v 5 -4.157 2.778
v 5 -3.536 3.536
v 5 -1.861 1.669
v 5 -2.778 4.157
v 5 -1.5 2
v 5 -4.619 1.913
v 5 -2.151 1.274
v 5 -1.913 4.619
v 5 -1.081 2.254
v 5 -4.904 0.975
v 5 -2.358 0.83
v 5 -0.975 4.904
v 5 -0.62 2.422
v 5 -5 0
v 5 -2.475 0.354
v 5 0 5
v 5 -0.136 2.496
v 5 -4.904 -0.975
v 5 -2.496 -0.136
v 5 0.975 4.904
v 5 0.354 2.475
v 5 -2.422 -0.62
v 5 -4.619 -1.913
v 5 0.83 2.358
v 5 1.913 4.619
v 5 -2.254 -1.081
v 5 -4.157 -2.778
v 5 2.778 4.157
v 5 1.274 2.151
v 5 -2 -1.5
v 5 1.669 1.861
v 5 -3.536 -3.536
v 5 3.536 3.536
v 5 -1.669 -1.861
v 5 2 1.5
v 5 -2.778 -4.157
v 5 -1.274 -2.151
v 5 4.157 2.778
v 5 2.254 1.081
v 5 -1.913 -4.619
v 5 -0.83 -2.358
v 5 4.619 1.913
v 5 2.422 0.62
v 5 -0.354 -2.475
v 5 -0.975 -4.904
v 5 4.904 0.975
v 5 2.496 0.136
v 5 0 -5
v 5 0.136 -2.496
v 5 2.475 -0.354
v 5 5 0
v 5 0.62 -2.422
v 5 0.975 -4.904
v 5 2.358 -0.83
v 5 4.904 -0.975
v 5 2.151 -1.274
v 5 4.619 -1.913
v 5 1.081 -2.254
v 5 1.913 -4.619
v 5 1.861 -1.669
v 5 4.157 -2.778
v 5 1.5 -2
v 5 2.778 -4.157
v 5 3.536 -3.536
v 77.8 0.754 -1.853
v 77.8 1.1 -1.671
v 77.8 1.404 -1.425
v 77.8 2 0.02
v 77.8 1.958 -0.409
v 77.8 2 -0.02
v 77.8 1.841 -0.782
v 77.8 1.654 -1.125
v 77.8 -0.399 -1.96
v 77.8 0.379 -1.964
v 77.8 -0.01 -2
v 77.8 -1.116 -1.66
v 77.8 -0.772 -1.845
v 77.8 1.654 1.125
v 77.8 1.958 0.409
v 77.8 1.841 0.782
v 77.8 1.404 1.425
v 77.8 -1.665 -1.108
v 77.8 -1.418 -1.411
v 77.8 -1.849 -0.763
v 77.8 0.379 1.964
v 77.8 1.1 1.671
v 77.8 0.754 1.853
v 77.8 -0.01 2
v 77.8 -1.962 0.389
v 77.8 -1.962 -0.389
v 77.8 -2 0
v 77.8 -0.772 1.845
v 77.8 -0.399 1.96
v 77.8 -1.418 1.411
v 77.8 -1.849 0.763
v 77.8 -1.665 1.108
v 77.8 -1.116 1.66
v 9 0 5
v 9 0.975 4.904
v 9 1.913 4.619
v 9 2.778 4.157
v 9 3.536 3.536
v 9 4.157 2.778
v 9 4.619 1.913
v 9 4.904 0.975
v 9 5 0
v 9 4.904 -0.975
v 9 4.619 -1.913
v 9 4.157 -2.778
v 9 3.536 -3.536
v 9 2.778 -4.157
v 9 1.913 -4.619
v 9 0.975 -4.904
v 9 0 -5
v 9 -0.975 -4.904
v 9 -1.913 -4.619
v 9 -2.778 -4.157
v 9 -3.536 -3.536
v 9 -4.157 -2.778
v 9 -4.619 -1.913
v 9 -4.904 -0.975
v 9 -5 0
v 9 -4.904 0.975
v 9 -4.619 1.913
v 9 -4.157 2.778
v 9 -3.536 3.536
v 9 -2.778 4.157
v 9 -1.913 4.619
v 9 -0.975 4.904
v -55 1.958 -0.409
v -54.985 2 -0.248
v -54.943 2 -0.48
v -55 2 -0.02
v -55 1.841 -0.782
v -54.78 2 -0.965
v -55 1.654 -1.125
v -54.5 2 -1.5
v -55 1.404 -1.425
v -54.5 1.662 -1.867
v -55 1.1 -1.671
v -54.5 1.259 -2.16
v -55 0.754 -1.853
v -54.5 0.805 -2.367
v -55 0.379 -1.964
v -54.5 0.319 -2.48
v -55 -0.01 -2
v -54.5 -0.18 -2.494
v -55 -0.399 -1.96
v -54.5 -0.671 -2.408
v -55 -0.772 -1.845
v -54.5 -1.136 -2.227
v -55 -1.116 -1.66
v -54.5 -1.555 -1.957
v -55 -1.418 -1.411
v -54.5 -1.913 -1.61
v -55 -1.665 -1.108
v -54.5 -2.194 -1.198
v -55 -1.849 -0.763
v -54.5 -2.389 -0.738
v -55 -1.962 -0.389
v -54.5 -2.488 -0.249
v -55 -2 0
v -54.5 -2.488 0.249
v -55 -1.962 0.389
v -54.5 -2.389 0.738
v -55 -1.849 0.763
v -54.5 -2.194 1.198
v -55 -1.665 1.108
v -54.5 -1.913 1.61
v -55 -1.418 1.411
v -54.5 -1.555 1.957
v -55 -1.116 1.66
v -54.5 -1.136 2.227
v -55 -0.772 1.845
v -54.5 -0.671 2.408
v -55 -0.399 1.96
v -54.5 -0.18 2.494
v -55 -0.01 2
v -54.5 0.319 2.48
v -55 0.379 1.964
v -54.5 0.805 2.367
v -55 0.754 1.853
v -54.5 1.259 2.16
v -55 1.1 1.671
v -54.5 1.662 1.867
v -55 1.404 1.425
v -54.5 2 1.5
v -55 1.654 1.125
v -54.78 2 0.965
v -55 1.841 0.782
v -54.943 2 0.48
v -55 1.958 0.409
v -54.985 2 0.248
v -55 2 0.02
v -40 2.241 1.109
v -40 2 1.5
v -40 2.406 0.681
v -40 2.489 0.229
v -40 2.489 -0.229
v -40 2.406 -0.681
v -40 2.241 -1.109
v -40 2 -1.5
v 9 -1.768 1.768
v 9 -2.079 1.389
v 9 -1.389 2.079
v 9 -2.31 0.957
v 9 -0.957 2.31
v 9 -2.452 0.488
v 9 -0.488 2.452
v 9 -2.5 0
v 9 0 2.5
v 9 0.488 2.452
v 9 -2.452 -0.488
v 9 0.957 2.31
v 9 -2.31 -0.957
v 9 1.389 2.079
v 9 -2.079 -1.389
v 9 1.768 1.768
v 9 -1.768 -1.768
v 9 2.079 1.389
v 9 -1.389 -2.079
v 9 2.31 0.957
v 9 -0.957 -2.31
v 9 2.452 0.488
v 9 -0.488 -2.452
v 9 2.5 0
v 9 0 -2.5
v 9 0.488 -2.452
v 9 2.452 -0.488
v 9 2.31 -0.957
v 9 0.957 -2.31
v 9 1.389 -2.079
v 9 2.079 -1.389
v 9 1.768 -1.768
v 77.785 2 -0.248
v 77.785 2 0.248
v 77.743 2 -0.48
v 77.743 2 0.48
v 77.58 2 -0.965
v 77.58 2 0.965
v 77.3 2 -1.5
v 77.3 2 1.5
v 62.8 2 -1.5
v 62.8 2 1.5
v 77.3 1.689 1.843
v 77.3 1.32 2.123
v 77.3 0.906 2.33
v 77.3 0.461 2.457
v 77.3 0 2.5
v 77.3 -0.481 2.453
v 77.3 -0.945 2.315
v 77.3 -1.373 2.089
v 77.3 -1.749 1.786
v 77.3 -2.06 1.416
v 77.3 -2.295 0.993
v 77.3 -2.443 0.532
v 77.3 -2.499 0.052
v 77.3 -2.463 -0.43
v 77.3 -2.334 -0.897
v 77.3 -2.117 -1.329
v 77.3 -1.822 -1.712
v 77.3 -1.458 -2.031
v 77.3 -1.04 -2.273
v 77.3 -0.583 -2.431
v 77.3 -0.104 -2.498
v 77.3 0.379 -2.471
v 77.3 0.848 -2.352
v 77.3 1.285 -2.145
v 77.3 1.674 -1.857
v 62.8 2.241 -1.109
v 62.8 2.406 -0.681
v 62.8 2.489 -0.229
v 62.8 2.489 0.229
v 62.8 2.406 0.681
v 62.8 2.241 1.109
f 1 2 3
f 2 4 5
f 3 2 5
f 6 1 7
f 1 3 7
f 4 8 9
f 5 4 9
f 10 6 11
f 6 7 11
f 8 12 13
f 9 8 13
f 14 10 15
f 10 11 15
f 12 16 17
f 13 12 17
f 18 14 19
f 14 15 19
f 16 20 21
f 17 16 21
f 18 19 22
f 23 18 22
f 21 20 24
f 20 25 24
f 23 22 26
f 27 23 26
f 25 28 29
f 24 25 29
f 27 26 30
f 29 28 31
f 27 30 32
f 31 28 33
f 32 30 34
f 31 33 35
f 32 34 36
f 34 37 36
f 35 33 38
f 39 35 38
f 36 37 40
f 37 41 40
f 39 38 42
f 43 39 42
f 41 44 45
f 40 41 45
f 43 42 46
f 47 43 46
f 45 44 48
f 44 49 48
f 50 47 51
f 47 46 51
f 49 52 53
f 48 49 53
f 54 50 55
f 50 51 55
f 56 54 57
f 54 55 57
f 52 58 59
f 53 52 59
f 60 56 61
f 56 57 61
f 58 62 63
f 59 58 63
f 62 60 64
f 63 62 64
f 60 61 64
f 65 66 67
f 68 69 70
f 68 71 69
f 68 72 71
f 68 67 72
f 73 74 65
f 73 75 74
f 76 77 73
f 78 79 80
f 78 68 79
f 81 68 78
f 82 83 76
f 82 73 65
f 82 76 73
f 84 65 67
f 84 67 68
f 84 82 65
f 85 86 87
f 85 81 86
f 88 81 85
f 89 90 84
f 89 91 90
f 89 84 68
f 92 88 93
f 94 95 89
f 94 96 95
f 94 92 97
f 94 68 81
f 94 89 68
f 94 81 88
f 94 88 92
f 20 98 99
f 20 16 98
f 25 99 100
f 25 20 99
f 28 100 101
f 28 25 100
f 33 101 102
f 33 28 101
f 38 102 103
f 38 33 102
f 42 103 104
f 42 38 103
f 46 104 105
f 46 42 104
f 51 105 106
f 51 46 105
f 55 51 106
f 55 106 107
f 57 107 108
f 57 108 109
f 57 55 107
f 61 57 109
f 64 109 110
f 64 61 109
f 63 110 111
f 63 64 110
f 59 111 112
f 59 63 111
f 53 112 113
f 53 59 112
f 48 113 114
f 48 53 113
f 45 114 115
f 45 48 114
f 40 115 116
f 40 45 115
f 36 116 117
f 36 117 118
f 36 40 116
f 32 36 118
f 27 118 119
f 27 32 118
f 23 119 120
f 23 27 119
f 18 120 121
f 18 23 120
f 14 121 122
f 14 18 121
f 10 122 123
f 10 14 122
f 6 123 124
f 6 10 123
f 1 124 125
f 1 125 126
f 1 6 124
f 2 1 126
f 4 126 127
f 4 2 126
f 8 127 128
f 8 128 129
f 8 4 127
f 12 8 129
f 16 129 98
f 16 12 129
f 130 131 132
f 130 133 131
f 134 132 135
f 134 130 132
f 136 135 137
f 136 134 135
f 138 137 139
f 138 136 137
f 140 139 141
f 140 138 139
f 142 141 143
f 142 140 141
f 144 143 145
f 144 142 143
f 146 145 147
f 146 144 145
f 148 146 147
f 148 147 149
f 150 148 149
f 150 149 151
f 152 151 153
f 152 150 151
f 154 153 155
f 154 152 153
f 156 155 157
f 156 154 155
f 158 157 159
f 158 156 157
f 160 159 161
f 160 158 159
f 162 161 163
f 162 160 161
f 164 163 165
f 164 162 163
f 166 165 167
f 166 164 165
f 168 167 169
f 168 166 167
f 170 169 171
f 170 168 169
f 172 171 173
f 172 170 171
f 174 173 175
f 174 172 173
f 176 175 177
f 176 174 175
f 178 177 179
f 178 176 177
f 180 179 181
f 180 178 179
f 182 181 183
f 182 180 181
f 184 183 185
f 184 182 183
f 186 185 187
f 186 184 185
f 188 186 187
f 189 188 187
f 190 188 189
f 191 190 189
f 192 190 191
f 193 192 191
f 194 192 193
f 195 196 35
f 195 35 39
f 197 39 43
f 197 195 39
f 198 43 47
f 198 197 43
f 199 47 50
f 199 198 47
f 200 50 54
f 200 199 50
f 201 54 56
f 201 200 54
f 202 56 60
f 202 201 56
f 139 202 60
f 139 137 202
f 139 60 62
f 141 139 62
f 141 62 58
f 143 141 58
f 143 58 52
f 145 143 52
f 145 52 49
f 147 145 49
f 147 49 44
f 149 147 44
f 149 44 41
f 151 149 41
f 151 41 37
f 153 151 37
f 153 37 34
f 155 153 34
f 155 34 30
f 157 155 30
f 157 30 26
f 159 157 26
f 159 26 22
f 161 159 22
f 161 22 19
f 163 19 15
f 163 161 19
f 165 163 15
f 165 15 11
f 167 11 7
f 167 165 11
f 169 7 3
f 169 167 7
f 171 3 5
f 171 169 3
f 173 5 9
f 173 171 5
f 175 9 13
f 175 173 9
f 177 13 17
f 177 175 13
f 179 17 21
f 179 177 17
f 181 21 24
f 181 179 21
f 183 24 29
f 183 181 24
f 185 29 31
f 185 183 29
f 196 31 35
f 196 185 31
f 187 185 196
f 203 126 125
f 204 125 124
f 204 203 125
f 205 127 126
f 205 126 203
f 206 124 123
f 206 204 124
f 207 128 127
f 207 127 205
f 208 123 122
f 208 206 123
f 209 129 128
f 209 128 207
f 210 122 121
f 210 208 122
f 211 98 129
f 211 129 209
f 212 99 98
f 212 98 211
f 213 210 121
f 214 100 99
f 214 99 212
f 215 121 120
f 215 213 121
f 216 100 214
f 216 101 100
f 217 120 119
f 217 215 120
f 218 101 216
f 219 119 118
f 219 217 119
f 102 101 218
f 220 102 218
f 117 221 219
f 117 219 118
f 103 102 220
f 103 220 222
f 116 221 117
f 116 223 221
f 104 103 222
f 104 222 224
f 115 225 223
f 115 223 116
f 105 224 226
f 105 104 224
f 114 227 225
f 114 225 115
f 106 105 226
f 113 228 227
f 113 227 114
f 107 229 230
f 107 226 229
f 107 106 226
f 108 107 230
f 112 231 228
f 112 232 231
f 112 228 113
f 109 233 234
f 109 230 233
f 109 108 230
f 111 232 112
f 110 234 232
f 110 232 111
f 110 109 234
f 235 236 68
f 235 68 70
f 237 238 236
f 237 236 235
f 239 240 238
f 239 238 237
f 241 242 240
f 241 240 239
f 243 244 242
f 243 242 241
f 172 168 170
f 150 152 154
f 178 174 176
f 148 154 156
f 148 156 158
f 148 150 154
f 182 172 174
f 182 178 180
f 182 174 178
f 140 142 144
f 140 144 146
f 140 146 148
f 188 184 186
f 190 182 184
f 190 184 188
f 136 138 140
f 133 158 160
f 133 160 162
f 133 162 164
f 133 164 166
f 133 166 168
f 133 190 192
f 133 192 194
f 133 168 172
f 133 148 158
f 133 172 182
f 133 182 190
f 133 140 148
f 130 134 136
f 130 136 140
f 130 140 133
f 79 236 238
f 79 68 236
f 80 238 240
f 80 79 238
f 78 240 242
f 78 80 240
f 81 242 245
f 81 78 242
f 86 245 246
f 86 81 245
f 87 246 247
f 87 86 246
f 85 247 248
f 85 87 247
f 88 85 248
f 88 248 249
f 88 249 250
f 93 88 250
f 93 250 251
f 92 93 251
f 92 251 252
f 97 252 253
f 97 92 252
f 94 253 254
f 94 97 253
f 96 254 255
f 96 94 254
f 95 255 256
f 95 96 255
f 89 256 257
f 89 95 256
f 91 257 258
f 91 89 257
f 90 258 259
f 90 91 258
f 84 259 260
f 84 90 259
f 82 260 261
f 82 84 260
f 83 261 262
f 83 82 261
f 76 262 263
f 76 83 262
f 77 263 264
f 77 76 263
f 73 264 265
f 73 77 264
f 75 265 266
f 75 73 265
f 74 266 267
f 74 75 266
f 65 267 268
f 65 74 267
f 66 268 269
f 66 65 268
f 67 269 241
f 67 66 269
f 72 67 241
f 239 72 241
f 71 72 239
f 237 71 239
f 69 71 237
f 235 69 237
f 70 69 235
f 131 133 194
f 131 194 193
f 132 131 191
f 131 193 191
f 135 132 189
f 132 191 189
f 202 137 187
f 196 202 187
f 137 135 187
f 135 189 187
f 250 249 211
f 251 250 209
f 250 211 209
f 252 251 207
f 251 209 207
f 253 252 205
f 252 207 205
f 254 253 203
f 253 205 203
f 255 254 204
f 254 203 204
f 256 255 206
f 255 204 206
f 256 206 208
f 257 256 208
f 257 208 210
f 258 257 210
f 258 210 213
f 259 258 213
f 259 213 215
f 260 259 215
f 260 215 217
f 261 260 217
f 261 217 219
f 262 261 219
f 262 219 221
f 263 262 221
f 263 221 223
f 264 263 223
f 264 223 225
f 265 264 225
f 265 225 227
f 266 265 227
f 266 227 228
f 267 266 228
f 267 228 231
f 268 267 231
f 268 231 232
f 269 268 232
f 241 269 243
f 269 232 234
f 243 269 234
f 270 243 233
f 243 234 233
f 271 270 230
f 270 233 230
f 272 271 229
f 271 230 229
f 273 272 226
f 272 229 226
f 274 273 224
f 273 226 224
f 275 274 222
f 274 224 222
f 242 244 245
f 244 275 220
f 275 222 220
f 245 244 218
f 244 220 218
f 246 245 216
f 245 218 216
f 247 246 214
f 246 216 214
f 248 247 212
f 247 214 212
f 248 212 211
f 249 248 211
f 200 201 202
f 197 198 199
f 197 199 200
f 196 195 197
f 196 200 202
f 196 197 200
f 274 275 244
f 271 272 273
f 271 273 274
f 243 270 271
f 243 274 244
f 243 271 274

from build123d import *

# Parameters (mm, degrees)
SKETCH1_W           = 4
SKETCH1_H           = 5
SKETCH2_R           = 2.5
BOSS_EXTRUDE1_DEPTH = 68.8
CUT_EXTRUDE1_START  = -15
CUT_EXTRUDE1_DEPTH  = 15
BOSS_EXTRUDE2_START = 60
SKETCH4_R           = 2.5
BOSS_EXTRUDE2_DEPTH = 60
CUT_EXTRUDE2_DEPTH  = 15
CHAMFER1_SIZE       = 0.5


with BuildPart() as part:
    # Sketch1 → Revolve1 (revolve)
    with BuildSketch(Plane(origin=(0, 0, 0), x_dir=(-1, 0, 0), z_dir=(0, 0, -1)), mode=Mode.PRIVATE) as revolve1_sk:
        with Locations((-7, 2.5)):
            Rectangle(SKETCH1_W, SKETCH1_H)
    revolve(revolve1_sk.sketch.rotate(Axis((9, 0, 0), (-1, 0, 0)), 270), axis=Axis((9, 0, 0), (-1, 0, 0)))

    # Sketch2 → Boss-Extrude1 (add)
    with BuildSketch(Plane(origin=(9, 0, 0), x_dir=(0, 0, -1), z_dir=(1, 0, 0))):
        with Locations(Location((0, 0, 0), (0, 0, 180))):
            Circle(SKETCH2_R)
    extrude(amount=BOSS_EXTRUDE1_DEPTH)

    # Sketch3 → Cut-Extrude1 (cut)
    with BuildSketch(Plane(origin=(77.8, 0, 0), x_dir=(0, 0, -1), z_dir=(1, 0, 0)).offset(CUT_EXTRUDE1_START)):
        with BuildLine():
            Line((-1.5, 2), (1.5, 2))
            ThreePointArc((1.5, 2), (0, 2.5), (-1.5, 2))
        make_face()
    extrude(amount=CUT_EXTRUDE1_DEPTH, mode=Mode.SUBTRACT)

    # Sketch4 → Boss-Extrude2 (add)
    with BuildSketch(Plane.ZY.offset(-5).offset(BOSS_EXTRUDE2_START)):
        with Locations(Location((0, 0, 0), (0, 0, 53.130102354))):
            Circle(SKETCH4_R)
    extrude(amount=-BOSS_EXTRUDE2_DEPTH)

    # Sketch5 → Cut-Extrude2 (cut)
    with BuildSketch(Plane.ZY.offset(55)):
        with BuildLine():
            Line((-1.5, 2), (1.5, 2))
            ThreePointArc((1.5, 2), (0, 2.5), (-1.5, 2))
        make_face()
    extrude(amount=-CUT_EXTRUDE2_DEPTH, mode=Mode.SUBTRACT)

    # Chamfer1
    chamfer1_edges = [part.edges().sort_by_distance(p)[0] for p in [
        (-55, -2.5, 0),
        (77.8, -2.236067977, -1.118033989),
    ]]
    chamfer(chamfer1_edges, length=CHAMFER1_SIZE - 0.0001)  # a hair under: the kernel refuses the full size


solid = part.part
